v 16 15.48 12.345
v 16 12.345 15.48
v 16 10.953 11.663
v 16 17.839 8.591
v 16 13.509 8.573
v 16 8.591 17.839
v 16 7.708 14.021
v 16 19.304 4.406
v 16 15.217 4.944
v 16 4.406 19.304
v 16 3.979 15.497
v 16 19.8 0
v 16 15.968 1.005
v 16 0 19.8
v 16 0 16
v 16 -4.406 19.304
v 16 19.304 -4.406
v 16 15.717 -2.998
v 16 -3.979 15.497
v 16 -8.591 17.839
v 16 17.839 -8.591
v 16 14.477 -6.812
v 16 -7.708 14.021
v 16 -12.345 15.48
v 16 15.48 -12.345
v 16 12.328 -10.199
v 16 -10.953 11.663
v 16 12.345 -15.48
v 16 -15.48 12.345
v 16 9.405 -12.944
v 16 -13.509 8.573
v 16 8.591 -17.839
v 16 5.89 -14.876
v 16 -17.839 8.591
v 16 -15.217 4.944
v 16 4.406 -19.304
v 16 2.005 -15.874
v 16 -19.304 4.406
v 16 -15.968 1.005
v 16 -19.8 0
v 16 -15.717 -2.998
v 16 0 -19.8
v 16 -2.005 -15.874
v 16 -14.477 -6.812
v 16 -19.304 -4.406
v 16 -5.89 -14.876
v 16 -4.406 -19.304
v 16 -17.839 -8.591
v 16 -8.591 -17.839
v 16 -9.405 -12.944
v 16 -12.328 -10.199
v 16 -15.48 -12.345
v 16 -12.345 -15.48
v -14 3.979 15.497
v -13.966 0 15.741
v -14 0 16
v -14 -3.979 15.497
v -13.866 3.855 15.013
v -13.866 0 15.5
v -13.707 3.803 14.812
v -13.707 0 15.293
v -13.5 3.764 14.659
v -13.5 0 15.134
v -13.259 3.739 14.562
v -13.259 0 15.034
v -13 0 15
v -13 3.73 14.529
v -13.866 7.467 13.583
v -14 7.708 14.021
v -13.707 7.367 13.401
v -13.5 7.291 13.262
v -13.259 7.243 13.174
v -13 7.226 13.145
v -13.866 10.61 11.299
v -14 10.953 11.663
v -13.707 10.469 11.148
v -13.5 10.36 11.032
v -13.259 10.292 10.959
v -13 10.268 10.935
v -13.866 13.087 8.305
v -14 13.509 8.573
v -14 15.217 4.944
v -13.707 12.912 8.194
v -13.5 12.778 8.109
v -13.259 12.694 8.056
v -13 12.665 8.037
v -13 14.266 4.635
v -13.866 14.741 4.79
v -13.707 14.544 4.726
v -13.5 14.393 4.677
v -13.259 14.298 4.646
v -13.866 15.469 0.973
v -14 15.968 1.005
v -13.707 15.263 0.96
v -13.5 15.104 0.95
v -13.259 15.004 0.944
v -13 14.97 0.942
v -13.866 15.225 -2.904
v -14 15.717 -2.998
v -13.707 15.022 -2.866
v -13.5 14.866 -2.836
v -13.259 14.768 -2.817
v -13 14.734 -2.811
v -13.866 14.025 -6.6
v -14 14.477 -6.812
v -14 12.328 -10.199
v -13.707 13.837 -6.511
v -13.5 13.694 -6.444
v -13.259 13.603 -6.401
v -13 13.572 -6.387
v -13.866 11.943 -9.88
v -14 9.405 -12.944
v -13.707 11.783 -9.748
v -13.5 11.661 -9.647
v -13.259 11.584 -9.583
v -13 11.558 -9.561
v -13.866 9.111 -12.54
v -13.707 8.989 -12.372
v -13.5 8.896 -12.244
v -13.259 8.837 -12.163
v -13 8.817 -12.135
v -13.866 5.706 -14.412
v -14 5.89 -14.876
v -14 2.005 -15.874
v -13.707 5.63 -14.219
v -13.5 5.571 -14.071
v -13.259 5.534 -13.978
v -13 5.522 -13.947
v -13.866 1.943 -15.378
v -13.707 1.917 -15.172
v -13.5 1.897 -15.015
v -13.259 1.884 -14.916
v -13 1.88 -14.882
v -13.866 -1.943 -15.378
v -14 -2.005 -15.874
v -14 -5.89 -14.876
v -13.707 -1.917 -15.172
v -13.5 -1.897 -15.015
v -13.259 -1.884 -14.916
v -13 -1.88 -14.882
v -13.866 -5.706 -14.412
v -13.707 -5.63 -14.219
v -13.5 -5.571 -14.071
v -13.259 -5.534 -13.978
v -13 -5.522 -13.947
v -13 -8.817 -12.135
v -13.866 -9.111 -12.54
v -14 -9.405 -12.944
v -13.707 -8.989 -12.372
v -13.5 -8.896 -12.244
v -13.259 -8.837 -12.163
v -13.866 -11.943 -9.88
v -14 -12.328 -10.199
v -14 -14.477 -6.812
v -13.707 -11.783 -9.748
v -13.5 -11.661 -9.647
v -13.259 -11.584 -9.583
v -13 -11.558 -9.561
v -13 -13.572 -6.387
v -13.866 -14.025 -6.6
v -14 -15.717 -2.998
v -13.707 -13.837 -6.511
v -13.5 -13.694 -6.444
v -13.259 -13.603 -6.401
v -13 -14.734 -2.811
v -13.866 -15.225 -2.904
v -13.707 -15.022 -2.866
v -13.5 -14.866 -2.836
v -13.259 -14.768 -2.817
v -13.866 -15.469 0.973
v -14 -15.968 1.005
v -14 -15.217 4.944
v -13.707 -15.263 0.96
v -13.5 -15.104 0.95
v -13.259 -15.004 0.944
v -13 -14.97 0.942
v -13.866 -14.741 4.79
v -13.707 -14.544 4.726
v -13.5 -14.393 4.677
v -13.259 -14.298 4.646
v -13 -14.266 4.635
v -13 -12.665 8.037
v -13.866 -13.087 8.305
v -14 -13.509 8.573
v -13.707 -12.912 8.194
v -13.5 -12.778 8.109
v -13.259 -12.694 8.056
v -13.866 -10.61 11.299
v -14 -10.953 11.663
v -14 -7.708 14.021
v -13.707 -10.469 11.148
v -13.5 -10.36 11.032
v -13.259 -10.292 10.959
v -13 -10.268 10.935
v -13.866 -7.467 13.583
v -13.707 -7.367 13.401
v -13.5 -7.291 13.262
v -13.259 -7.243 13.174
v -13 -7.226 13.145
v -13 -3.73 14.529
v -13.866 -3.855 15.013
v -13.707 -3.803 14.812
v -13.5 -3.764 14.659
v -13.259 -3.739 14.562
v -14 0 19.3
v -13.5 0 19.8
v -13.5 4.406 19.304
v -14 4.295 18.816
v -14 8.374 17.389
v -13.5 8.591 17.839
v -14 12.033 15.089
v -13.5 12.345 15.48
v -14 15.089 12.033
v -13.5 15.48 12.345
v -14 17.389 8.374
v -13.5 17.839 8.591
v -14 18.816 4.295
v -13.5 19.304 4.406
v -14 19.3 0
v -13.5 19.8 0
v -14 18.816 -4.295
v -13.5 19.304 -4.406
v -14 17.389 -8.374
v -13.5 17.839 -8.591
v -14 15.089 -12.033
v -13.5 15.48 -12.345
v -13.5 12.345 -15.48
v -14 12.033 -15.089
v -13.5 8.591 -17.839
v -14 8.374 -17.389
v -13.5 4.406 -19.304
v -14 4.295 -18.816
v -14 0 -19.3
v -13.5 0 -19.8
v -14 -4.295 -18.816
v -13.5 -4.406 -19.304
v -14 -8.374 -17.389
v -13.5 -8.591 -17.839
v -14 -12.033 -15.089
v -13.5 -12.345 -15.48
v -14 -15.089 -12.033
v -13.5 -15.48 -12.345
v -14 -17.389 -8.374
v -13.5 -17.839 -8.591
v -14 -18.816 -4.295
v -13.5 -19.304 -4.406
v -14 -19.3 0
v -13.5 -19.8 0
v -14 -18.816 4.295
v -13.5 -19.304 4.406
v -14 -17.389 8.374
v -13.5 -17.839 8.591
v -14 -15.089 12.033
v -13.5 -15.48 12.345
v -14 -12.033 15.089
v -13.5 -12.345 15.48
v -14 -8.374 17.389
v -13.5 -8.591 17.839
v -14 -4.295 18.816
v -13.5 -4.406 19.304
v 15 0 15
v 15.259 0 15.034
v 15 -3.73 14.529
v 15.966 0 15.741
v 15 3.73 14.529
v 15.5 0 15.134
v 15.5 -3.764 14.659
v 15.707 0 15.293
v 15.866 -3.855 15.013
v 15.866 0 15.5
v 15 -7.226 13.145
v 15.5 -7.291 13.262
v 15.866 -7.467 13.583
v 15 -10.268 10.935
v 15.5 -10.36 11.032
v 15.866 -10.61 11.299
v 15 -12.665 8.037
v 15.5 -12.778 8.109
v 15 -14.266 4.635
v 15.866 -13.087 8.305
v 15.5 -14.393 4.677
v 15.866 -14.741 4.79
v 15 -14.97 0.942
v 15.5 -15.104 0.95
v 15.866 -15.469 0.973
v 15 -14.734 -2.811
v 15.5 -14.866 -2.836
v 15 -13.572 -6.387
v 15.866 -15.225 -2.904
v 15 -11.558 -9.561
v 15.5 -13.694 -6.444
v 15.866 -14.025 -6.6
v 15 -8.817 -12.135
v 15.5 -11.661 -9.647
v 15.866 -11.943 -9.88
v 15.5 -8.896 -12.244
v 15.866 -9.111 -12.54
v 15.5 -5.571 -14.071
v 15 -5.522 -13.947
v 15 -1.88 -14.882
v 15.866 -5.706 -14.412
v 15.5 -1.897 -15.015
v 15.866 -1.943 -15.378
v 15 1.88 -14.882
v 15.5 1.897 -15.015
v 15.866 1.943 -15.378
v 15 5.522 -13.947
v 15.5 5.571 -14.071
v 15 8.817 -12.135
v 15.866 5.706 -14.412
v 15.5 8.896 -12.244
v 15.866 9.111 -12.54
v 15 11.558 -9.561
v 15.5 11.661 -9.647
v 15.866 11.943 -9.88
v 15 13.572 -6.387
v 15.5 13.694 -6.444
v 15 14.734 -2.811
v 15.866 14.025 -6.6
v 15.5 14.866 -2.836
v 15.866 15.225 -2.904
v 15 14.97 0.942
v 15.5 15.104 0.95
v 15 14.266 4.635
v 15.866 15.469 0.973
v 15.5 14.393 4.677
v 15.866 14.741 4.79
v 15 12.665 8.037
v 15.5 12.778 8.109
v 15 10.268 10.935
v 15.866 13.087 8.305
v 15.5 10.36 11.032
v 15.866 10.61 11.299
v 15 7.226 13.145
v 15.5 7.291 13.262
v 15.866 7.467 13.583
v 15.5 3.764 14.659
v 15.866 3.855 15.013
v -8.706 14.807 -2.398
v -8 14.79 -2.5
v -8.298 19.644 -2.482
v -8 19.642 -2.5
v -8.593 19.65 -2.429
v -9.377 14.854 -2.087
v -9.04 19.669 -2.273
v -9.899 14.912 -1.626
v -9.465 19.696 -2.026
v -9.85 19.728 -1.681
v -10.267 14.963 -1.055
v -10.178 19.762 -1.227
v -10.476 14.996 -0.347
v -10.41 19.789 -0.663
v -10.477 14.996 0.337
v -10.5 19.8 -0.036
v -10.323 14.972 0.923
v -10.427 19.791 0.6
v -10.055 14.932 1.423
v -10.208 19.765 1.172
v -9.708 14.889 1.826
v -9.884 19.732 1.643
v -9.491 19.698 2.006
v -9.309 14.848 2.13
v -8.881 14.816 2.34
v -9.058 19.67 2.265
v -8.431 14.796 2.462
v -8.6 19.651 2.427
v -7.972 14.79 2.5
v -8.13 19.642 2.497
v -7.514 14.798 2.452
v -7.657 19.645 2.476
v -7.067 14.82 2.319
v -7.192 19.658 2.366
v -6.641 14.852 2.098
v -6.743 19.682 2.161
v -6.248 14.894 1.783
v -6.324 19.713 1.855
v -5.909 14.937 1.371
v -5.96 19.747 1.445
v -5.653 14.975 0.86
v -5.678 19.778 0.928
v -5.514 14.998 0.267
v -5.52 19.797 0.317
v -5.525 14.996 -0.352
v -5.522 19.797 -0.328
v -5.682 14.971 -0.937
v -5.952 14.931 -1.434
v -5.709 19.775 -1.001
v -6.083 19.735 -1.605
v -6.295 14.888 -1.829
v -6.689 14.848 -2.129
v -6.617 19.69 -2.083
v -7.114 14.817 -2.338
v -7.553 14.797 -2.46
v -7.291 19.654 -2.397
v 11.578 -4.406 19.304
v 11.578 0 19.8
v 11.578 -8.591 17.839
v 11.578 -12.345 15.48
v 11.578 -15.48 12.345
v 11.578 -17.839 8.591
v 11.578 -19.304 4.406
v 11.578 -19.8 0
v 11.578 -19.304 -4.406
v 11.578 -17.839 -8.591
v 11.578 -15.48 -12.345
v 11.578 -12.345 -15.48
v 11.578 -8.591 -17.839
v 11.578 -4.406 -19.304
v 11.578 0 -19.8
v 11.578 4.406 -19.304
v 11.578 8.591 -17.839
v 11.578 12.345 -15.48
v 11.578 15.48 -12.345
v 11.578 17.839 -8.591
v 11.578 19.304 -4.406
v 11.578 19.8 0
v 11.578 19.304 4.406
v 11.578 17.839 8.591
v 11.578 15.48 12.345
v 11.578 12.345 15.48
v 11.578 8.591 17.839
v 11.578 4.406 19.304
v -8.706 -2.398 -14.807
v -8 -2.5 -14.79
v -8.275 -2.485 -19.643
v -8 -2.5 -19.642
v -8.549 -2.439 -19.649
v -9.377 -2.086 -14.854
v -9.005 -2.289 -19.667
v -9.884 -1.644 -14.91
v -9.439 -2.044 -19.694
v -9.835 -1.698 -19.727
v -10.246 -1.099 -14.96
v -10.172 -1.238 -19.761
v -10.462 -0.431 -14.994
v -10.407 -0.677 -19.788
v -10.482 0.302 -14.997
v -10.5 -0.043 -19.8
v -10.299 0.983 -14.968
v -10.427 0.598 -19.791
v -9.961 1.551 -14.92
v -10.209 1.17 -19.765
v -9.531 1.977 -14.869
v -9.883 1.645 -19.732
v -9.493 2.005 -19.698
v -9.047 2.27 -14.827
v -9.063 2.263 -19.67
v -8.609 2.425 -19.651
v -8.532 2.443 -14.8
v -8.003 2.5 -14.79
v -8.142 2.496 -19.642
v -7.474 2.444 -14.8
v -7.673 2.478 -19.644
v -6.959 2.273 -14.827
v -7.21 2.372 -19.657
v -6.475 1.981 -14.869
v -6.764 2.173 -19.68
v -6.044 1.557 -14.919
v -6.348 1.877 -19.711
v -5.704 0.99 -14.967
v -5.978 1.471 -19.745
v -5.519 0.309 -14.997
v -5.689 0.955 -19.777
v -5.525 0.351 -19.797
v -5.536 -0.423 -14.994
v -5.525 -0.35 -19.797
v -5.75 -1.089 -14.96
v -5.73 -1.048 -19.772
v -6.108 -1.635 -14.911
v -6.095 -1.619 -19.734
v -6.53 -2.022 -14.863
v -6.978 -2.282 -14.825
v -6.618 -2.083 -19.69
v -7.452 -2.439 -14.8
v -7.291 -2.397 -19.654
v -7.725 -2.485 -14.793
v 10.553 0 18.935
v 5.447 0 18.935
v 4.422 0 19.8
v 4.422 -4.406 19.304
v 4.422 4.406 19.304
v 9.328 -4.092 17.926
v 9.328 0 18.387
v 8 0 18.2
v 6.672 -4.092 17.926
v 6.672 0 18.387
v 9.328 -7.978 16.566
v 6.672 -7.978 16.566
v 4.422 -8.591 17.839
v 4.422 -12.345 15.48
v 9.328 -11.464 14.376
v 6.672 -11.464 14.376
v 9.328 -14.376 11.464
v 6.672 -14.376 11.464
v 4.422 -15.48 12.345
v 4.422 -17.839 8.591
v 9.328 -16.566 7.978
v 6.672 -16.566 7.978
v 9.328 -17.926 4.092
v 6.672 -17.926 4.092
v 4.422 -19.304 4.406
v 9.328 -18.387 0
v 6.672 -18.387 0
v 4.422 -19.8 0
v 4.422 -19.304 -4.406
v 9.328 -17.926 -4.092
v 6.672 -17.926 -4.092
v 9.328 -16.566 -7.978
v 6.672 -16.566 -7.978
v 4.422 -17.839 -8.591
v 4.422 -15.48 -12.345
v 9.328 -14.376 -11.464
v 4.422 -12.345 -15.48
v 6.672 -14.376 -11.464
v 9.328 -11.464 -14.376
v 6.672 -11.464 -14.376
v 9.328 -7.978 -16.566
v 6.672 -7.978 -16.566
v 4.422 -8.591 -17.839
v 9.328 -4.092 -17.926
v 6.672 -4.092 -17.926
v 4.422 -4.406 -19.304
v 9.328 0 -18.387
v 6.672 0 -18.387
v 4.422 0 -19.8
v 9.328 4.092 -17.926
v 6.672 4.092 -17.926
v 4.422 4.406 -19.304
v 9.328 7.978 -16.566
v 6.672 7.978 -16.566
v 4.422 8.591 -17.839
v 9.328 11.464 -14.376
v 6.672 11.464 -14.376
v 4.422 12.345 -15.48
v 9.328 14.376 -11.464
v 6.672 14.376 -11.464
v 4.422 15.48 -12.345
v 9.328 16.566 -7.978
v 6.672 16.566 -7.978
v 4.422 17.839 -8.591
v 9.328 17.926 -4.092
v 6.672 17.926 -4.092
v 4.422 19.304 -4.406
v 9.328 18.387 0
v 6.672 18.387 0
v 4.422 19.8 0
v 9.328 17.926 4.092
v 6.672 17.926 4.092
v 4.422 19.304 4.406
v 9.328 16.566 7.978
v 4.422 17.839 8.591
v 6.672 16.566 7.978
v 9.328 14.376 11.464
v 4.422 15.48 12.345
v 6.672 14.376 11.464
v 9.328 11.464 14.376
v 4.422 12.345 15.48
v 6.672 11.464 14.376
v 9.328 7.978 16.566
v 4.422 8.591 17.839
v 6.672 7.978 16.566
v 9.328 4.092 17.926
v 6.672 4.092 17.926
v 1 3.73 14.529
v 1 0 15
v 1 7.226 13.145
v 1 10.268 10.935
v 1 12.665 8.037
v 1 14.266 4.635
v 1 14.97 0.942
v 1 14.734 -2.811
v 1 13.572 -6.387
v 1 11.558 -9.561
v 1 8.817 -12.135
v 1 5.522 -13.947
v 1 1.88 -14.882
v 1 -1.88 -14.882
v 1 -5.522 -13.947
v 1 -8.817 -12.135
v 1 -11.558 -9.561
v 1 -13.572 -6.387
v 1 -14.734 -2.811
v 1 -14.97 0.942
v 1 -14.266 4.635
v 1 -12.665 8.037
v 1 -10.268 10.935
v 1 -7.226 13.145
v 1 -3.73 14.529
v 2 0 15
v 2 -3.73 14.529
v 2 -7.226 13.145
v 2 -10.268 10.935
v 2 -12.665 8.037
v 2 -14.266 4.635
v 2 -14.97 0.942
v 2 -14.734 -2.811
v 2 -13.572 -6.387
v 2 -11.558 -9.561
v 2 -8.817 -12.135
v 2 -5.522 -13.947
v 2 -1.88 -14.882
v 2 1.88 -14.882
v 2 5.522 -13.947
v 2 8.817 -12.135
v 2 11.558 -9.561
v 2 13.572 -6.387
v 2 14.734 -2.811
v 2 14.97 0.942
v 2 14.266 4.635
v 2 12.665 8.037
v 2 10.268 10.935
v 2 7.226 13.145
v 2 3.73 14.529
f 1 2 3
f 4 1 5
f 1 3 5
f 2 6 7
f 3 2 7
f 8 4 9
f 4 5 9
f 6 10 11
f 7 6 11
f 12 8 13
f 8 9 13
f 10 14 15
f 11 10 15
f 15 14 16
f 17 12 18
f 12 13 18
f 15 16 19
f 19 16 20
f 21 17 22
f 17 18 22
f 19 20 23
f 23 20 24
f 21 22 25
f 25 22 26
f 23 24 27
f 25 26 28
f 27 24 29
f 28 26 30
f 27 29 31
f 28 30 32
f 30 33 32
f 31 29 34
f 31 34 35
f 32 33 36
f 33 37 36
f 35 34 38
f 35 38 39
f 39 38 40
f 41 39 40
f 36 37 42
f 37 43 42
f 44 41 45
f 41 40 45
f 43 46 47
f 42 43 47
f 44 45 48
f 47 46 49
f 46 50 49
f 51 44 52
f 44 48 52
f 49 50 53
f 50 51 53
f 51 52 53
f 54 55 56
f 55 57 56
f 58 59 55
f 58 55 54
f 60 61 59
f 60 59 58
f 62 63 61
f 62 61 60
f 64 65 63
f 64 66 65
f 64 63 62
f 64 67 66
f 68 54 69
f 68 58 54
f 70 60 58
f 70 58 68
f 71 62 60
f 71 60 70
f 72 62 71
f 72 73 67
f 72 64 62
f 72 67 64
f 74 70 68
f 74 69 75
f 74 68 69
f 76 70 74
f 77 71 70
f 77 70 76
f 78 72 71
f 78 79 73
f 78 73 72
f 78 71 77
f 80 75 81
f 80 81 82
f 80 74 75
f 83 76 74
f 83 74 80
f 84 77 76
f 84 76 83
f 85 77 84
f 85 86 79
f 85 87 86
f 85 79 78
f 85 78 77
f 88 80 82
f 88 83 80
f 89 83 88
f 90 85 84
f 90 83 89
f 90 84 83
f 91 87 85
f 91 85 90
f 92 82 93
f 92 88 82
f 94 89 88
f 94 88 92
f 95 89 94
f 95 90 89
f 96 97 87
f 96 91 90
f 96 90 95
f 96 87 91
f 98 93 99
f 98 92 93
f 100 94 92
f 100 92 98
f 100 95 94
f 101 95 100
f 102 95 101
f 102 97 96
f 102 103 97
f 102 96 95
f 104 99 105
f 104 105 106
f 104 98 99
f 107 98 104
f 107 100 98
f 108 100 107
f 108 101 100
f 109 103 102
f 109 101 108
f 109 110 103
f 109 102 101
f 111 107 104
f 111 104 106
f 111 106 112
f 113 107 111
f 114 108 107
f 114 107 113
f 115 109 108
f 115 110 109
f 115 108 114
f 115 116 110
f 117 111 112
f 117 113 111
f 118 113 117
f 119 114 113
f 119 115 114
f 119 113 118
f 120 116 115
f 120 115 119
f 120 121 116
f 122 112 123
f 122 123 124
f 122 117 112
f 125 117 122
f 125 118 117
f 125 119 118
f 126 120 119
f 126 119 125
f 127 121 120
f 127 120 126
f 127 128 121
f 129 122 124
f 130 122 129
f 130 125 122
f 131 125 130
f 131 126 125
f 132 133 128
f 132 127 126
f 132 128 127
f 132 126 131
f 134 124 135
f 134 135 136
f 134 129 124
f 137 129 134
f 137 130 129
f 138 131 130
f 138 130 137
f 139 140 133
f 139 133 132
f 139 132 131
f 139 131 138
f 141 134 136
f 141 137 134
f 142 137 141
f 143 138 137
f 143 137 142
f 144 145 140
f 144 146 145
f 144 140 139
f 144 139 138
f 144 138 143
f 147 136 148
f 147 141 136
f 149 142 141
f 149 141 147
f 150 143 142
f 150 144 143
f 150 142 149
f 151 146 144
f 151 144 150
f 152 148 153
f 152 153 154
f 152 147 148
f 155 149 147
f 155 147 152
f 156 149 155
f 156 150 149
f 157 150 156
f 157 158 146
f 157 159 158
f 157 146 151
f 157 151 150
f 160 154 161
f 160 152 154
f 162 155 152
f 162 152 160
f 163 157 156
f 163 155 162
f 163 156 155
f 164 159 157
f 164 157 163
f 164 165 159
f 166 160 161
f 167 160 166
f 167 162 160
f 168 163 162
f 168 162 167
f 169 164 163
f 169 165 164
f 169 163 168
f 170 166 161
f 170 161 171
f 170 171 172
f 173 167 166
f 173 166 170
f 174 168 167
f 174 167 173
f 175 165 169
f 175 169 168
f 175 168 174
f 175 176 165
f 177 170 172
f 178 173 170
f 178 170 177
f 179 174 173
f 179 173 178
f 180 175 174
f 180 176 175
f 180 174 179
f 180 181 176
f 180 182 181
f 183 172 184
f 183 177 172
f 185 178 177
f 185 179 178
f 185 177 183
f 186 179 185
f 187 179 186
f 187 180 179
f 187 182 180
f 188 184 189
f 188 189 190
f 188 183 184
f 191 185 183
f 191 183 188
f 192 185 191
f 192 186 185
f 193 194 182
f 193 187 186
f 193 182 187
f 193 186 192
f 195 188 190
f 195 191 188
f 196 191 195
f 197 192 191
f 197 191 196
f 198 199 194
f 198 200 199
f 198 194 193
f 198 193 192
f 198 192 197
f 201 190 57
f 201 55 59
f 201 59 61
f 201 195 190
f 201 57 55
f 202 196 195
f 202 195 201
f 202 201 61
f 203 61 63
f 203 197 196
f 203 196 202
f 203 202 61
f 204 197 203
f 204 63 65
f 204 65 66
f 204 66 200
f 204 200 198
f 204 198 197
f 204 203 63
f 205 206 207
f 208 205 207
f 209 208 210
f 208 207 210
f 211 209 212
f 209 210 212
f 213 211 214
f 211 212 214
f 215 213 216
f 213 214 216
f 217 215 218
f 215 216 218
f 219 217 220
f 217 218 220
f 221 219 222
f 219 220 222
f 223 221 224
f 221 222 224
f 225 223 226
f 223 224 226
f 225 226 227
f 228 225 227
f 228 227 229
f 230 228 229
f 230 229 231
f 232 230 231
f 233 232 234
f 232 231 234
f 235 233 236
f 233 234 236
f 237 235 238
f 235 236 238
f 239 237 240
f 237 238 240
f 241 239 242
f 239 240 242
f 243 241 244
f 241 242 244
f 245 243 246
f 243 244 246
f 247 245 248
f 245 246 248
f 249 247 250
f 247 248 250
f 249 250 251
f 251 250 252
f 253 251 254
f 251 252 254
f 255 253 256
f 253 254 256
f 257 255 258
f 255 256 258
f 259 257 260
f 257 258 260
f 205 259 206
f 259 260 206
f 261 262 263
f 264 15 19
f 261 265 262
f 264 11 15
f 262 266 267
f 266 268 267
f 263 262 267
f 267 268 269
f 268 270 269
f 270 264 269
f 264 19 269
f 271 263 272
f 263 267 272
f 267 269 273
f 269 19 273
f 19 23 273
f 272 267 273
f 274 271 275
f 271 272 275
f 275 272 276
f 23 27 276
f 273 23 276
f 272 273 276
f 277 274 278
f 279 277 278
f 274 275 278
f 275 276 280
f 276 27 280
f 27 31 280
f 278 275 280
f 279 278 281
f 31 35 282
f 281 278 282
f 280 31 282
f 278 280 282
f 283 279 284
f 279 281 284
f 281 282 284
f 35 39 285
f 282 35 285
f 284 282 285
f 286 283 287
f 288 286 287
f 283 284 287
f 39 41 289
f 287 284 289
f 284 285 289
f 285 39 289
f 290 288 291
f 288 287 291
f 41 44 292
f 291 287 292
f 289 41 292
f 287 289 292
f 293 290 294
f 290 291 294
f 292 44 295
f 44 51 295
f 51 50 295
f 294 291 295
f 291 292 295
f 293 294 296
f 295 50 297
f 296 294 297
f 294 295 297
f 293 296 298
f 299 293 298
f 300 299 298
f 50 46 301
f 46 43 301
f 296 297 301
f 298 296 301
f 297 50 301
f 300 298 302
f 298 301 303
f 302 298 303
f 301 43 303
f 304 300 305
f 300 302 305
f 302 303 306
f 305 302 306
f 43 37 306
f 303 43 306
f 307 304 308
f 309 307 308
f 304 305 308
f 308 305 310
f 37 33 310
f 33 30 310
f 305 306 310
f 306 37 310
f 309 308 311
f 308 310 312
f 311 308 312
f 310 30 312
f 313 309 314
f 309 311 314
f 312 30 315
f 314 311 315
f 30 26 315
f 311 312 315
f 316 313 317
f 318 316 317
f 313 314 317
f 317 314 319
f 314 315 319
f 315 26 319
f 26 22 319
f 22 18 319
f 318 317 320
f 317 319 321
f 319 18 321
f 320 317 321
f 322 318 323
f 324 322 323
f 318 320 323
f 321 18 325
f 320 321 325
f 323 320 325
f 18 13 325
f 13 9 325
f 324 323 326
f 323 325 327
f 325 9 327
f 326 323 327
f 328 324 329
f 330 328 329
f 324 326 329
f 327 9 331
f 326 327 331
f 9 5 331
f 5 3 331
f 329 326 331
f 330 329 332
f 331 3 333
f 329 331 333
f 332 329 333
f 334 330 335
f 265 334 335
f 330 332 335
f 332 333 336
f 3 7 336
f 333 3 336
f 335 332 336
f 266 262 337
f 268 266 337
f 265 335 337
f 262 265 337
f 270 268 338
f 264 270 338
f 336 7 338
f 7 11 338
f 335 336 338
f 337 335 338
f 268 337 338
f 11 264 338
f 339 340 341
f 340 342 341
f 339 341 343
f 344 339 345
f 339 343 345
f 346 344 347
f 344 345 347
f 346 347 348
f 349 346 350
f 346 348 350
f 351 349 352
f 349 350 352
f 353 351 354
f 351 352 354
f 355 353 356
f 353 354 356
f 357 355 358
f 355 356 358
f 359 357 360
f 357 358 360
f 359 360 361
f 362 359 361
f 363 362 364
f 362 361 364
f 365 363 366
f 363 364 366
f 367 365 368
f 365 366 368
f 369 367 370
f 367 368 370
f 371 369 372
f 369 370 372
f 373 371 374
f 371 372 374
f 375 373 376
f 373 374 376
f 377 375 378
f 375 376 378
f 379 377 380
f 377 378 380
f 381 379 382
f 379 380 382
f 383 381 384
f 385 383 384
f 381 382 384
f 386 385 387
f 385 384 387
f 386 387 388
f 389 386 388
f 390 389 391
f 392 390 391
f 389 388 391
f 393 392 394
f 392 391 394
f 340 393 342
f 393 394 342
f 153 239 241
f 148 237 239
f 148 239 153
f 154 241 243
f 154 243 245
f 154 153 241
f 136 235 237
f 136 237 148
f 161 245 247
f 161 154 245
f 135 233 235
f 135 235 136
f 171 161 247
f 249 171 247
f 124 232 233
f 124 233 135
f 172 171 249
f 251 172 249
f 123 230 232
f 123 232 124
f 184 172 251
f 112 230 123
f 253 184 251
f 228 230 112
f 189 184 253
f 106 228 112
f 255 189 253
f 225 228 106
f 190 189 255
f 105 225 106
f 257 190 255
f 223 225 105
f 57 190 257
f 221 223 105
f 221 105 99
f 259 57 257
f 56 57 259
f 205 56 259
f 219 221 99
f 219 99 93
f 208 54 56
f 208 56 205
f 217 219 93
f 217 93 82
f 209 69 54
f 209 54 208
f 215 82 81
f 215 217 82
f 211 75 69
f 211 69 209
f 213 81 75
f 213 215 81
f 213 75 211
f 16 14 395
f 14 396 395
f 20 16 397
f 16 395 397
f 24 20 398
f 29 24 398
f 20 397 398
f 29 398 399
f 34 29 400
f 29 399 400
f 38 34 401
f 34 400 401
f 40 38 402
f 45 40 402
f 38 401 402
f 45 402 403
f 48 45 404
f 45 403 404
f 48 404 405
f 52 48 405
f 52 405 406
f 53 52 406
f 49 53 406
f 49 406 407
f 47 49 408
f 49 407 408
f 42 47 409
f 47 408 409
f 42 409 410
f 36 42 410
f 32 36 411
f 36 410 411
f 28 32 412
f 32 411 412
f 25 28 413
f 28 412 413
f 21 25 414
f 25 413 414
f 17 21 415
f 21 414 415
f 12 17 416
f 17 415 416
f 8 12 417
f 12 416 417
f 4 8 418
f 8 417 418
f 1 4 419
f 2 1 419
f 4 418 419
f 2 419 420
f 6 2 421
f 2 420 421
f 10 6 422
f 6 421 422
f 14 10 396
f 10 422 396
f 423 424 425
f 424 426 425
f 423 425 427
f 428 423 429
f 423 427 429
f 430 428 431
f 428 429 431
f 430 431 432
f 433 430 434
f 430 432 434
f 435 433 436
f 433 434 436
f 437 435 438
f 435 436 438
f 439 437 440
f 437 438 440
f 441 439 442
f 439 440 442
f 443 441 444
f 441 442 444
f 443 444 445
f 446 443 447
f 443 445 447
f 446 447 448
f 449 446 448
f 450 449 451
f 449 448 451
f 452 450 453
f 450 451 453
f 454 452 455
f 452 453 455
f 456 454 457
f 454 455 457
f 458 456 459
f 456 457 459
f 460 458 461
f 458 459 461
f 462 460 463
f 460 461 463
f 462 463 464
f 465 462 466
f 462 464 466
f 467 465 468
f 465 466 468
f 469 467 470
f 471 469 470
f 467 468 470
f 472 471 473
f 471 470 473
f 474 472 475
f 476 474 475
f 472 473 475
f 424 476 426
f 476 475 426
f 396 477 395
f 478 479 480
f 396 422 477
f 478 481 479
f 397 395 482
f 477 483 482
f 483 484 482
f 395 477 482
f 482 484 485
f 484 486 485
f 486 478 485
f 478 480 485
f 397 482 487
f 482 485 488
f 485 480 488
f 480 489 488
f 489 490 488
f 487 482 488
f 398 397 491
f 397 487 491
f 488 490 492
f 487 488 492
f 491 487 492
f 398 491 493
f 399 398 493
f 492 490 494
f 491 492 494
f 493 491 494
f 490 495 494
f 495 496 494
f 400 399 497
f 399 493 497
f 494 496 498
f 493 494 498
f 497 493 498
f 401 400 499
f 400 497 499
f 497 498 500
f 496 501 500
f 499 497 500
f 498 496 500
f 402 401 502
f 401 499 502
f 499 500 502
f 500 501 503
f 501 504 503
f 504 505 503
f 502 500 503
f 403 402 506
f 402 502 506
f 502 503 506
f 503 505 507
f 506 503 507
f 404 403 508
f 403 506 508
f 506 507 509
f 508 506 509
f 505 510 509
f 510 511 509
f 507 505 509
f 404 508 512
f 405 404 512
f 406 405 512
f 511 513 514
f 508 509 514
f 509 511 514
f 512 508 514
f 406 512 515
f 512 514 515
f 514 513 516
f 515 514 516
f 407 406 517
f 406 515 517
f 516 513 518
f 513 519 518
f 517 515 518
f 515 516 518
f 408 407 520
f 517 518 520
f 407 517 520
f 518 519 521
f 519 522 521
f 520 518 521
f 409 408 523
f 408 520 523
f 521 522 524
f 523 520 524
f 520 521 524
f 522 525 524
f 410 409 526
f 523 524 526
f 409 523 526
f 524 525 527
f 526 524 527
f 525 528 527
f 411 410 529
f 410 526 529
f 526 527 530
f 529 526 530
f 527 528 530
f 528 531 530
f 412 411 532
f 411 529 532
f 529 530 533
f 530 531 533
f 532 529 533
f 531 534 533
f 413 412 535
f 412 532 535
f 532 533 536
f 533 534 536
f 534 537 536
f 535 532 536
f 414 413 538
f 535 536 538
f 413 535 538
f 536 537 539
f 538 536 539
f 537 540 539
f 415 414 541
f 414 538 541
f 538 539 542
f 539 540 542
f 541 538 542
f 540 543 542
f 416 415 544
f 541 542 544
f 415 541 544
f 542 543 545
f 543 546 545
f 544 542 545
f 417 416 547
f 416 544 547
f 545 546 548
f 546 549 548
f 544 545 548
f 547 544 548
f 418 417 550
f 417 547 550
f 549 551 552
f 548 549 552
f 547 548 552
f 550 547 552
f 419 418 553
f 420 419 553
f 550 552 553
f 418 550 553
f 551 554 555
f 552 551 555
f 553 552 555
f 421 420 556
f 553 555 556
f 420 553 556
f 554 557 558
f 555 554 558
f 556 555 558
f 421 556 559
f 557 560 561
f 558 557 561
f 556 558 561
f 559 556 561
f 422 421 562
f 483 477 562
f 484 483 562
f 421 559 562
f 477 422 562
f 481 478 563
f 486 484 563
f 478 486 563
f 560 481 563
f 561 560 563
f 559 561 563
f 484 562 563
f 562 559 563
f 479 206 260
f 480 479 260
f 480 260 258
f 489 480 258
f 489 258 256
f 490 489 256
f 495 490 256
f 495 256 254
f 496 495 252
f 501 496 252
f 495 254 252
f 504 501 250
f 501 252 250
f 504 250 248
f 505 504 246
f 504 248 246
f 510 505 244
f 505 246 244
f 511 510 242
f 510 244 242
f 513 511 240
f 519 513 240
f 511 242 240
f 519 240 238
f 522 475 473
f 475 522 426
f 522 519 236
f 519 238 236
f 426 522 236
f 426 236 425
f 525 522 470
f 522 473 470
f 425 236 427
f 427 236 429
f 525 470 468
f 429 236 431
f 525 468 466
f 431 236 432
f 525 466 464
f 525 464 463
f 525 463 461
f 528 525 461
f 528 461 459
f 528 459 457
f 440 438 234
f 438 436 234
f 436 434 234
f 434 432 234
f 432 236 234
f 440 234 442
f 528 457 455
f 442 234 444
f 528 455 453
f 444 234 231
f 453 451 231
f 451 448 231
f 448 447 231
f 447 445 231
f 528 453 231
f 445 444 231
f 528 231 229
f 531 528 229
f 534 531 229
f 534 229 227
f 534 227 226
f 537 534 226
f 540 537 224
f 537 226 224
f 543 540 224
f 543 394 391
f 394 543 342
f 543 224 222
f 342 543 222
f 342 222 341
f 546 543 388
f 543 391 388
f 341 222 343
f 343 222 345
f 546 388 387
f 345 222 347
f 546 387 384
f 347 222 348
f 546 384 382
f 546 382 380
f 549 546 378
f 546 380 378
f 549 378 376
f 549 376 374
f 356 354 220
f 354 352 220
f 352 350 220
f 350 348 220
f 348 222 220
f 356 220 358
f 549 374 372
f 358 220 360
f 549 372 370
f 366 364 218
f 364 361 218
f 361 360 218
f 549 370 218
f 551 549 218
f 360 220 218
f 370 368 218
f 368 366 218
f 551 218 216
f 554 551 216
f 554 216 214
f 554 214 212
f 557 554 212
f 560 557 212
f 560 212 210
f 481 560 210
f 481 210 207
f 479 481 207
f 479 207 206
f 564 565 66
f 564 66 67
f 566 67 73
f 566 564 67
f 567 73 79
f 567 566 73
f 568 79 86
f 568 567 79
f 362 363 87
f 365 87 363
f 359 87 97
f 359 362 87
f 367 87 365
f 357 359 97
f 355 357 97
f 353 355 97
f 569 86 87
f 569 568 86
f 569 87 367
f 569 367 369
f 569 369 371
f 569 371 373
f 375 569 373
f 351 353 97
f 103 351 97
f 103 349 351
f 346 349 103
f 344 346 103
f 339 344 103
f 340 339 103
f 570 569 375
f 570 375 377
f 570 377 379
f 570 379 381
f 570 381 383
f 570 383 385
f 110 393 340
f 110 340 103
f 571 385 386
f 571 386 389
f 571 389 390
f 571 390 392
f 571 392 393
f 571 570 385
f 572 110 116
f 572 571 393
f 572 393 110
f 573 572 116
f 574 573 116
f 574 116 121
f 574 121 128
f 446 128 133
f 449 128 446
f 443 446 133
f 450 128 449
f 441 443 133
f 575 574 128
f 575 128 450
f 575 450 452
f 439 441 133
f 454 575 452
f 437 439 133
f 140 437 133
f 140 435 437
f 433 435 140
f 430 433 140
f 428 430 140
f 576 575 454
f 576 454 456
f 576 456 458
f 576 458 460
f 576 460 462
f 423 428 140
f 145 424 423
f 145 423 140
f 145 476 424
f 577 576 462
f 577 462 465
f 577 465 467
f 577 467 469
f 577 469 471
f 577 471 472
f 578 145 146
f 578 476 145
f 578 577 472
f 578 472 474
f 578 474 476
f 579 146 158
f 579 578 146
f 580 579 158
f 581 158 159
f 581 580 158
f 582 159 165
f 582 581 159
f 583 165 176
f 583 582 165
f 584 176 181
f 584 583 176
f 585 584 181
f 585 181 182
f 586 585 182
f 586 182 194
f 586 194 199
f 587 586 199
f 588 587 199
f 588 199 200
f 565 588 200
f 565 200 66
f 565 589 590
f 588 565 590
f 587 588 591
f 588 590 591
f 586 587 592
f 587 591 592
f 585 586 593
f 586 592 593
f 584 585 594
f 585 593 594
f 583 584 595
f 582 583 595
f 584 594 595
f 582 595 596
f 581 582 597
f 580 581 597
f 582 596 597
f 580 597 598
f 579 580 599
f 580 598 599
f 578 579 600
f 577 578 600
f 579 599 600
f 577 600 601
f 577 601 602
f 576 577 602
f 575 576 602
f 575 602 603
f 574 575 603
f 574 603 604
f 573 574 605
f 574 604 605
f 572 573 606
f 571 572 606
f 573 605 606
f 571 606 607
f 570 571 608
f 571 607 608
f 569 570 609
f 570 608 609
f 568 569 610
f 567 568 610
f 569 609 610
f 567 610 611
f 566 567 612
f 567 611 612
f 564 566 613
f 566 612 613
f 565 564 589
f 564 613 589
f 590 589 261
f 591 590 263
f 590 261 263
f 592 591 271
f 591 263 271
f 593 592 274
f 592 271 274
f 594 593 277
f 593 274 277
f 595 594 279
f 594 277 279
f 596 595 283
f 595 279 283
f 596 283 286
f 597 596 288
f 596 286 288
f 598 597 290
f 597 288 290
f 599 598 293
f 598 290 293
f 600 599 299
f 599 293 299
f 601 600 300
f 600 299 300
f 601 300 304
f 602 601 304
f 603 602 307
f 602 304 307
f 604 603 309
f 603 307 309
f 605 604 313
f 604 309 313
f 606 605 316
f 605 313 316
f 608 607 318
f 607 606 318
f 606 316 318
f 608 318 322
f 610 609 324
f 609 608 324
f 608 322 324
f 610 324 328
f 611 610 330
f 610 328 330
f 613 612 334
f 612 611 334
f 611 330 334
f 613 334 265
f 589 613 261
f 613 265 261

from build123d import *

# Parameters (mm, degrees)
EXTRUSION1_DEPTH             = 14
EXTRUSION1_DEPTH_BACK        = 2
ESQUISSE2_R                  = 19.8
ESQUISSE2_R_2                = 15
CONG_1_R                     = 1
CHANFREIN1_SIZE              = 0.5
ESQUISSE5_W                  = 2.5
ESQUISSE5_H                  = 19.8
R_P_TITION_CIRCULAIRE1_COUNT = 2
R_P_TITION_CIRCULAIRE1_ANGLE = 90


with BuildPart() as part:
    # Esquisse1 → Base-Révolution (revolve)
    with BuildSketch(Plane(origin=(0, 0, 0), x_dir=(1, 0, 0), z_dir=(0, 1, 0))):
        with BuildLine():
            Line((0, 19.8), (0, 16))
            ThreePointArc((0, 16), (0.292893219, 15.292893219), (1, 15))
            Line((1, 15), (15, 15))
            ThreePointArc((15, 15), (15.707106781, 15.292893219), (16, 16))
            Line((16, 16), (16, 19.8))
            Line((16, 19.8), (11.577708764, 19.8))
            ThreePointArc((11.577708764, 19.8), (8, 18.2), (4.422291236, 19.8))
            Line((4.422291236, 19.8), (0, 19.8))
        make_face()
    revolve(axis=Axis((0, 0, 0), (1, 0, 0)))

    # Esquisse2 → Extrusion1 (add, two sides: drawn at the far end of the back side and taken through both)
    with BuildSketch(Plane.ZY.offset(-EXTRUSION1_DEPTH_BACK)):
        Circle(ESQUISSE2_R)
        Circle(ESQUISSE2_R_2, mode=Mode.SUBTRACT)
    extrude(amount=EXTRUSION1_DEPTH + EXTRUSION1_DEPTH_BACK)

    # Congé1
    cong_1_edges = [part.edges().sort_by_distance(p)[0] for p in [
        (-14, 0, -15),
    ]]
    fillet(cong_1_edges, radius=CONG_1_R)

    # Chanfrein1
    chanfrein1_edges = [part.edges().sort_by_distance(p)[0] for p in [
        (-14, 0, -19.8),
    ]]
    chamfer(chanfrein1_edges, length=CHANFREIN1_SIZE)

    # Esquisse5 → Trou taraudé M61 (revolve, cut)
    with BuildSketch(Plane(origin=(-8, 0, 0), x_dir=(0, 0, -1), z_dir=(1, 0, 0))):
        with Locations((1.25, 9.9)):
            Rectangle(ESQUISSE5_W, ESQUISSE5_H)
    trou_taraud_m61 = revolve(axis=Axis((-8, -6.35, 0), (0, 1, 0)), mode=Mode.SUBTRACT)

    # Répétition circulaire1: Trou taraudé M61 ×2 about axis
    r_p_tition_circulaire1_axis = Axis((15, 0, 0), (-1, 0, 0))
    for i in range(1, R_P_TITION_CIRCULAIRE1_COUNT):
        add(trou_taraud_m61.rotate(r_p_tition_circulaire1_axis, i * R_P_TITION_CIRCULAIRE1_ANGLE / (R_P_TITION_CIRCULAIRE1_COUNT - 1)), mode=Mode.SUBTRACT)


solid = part.part
